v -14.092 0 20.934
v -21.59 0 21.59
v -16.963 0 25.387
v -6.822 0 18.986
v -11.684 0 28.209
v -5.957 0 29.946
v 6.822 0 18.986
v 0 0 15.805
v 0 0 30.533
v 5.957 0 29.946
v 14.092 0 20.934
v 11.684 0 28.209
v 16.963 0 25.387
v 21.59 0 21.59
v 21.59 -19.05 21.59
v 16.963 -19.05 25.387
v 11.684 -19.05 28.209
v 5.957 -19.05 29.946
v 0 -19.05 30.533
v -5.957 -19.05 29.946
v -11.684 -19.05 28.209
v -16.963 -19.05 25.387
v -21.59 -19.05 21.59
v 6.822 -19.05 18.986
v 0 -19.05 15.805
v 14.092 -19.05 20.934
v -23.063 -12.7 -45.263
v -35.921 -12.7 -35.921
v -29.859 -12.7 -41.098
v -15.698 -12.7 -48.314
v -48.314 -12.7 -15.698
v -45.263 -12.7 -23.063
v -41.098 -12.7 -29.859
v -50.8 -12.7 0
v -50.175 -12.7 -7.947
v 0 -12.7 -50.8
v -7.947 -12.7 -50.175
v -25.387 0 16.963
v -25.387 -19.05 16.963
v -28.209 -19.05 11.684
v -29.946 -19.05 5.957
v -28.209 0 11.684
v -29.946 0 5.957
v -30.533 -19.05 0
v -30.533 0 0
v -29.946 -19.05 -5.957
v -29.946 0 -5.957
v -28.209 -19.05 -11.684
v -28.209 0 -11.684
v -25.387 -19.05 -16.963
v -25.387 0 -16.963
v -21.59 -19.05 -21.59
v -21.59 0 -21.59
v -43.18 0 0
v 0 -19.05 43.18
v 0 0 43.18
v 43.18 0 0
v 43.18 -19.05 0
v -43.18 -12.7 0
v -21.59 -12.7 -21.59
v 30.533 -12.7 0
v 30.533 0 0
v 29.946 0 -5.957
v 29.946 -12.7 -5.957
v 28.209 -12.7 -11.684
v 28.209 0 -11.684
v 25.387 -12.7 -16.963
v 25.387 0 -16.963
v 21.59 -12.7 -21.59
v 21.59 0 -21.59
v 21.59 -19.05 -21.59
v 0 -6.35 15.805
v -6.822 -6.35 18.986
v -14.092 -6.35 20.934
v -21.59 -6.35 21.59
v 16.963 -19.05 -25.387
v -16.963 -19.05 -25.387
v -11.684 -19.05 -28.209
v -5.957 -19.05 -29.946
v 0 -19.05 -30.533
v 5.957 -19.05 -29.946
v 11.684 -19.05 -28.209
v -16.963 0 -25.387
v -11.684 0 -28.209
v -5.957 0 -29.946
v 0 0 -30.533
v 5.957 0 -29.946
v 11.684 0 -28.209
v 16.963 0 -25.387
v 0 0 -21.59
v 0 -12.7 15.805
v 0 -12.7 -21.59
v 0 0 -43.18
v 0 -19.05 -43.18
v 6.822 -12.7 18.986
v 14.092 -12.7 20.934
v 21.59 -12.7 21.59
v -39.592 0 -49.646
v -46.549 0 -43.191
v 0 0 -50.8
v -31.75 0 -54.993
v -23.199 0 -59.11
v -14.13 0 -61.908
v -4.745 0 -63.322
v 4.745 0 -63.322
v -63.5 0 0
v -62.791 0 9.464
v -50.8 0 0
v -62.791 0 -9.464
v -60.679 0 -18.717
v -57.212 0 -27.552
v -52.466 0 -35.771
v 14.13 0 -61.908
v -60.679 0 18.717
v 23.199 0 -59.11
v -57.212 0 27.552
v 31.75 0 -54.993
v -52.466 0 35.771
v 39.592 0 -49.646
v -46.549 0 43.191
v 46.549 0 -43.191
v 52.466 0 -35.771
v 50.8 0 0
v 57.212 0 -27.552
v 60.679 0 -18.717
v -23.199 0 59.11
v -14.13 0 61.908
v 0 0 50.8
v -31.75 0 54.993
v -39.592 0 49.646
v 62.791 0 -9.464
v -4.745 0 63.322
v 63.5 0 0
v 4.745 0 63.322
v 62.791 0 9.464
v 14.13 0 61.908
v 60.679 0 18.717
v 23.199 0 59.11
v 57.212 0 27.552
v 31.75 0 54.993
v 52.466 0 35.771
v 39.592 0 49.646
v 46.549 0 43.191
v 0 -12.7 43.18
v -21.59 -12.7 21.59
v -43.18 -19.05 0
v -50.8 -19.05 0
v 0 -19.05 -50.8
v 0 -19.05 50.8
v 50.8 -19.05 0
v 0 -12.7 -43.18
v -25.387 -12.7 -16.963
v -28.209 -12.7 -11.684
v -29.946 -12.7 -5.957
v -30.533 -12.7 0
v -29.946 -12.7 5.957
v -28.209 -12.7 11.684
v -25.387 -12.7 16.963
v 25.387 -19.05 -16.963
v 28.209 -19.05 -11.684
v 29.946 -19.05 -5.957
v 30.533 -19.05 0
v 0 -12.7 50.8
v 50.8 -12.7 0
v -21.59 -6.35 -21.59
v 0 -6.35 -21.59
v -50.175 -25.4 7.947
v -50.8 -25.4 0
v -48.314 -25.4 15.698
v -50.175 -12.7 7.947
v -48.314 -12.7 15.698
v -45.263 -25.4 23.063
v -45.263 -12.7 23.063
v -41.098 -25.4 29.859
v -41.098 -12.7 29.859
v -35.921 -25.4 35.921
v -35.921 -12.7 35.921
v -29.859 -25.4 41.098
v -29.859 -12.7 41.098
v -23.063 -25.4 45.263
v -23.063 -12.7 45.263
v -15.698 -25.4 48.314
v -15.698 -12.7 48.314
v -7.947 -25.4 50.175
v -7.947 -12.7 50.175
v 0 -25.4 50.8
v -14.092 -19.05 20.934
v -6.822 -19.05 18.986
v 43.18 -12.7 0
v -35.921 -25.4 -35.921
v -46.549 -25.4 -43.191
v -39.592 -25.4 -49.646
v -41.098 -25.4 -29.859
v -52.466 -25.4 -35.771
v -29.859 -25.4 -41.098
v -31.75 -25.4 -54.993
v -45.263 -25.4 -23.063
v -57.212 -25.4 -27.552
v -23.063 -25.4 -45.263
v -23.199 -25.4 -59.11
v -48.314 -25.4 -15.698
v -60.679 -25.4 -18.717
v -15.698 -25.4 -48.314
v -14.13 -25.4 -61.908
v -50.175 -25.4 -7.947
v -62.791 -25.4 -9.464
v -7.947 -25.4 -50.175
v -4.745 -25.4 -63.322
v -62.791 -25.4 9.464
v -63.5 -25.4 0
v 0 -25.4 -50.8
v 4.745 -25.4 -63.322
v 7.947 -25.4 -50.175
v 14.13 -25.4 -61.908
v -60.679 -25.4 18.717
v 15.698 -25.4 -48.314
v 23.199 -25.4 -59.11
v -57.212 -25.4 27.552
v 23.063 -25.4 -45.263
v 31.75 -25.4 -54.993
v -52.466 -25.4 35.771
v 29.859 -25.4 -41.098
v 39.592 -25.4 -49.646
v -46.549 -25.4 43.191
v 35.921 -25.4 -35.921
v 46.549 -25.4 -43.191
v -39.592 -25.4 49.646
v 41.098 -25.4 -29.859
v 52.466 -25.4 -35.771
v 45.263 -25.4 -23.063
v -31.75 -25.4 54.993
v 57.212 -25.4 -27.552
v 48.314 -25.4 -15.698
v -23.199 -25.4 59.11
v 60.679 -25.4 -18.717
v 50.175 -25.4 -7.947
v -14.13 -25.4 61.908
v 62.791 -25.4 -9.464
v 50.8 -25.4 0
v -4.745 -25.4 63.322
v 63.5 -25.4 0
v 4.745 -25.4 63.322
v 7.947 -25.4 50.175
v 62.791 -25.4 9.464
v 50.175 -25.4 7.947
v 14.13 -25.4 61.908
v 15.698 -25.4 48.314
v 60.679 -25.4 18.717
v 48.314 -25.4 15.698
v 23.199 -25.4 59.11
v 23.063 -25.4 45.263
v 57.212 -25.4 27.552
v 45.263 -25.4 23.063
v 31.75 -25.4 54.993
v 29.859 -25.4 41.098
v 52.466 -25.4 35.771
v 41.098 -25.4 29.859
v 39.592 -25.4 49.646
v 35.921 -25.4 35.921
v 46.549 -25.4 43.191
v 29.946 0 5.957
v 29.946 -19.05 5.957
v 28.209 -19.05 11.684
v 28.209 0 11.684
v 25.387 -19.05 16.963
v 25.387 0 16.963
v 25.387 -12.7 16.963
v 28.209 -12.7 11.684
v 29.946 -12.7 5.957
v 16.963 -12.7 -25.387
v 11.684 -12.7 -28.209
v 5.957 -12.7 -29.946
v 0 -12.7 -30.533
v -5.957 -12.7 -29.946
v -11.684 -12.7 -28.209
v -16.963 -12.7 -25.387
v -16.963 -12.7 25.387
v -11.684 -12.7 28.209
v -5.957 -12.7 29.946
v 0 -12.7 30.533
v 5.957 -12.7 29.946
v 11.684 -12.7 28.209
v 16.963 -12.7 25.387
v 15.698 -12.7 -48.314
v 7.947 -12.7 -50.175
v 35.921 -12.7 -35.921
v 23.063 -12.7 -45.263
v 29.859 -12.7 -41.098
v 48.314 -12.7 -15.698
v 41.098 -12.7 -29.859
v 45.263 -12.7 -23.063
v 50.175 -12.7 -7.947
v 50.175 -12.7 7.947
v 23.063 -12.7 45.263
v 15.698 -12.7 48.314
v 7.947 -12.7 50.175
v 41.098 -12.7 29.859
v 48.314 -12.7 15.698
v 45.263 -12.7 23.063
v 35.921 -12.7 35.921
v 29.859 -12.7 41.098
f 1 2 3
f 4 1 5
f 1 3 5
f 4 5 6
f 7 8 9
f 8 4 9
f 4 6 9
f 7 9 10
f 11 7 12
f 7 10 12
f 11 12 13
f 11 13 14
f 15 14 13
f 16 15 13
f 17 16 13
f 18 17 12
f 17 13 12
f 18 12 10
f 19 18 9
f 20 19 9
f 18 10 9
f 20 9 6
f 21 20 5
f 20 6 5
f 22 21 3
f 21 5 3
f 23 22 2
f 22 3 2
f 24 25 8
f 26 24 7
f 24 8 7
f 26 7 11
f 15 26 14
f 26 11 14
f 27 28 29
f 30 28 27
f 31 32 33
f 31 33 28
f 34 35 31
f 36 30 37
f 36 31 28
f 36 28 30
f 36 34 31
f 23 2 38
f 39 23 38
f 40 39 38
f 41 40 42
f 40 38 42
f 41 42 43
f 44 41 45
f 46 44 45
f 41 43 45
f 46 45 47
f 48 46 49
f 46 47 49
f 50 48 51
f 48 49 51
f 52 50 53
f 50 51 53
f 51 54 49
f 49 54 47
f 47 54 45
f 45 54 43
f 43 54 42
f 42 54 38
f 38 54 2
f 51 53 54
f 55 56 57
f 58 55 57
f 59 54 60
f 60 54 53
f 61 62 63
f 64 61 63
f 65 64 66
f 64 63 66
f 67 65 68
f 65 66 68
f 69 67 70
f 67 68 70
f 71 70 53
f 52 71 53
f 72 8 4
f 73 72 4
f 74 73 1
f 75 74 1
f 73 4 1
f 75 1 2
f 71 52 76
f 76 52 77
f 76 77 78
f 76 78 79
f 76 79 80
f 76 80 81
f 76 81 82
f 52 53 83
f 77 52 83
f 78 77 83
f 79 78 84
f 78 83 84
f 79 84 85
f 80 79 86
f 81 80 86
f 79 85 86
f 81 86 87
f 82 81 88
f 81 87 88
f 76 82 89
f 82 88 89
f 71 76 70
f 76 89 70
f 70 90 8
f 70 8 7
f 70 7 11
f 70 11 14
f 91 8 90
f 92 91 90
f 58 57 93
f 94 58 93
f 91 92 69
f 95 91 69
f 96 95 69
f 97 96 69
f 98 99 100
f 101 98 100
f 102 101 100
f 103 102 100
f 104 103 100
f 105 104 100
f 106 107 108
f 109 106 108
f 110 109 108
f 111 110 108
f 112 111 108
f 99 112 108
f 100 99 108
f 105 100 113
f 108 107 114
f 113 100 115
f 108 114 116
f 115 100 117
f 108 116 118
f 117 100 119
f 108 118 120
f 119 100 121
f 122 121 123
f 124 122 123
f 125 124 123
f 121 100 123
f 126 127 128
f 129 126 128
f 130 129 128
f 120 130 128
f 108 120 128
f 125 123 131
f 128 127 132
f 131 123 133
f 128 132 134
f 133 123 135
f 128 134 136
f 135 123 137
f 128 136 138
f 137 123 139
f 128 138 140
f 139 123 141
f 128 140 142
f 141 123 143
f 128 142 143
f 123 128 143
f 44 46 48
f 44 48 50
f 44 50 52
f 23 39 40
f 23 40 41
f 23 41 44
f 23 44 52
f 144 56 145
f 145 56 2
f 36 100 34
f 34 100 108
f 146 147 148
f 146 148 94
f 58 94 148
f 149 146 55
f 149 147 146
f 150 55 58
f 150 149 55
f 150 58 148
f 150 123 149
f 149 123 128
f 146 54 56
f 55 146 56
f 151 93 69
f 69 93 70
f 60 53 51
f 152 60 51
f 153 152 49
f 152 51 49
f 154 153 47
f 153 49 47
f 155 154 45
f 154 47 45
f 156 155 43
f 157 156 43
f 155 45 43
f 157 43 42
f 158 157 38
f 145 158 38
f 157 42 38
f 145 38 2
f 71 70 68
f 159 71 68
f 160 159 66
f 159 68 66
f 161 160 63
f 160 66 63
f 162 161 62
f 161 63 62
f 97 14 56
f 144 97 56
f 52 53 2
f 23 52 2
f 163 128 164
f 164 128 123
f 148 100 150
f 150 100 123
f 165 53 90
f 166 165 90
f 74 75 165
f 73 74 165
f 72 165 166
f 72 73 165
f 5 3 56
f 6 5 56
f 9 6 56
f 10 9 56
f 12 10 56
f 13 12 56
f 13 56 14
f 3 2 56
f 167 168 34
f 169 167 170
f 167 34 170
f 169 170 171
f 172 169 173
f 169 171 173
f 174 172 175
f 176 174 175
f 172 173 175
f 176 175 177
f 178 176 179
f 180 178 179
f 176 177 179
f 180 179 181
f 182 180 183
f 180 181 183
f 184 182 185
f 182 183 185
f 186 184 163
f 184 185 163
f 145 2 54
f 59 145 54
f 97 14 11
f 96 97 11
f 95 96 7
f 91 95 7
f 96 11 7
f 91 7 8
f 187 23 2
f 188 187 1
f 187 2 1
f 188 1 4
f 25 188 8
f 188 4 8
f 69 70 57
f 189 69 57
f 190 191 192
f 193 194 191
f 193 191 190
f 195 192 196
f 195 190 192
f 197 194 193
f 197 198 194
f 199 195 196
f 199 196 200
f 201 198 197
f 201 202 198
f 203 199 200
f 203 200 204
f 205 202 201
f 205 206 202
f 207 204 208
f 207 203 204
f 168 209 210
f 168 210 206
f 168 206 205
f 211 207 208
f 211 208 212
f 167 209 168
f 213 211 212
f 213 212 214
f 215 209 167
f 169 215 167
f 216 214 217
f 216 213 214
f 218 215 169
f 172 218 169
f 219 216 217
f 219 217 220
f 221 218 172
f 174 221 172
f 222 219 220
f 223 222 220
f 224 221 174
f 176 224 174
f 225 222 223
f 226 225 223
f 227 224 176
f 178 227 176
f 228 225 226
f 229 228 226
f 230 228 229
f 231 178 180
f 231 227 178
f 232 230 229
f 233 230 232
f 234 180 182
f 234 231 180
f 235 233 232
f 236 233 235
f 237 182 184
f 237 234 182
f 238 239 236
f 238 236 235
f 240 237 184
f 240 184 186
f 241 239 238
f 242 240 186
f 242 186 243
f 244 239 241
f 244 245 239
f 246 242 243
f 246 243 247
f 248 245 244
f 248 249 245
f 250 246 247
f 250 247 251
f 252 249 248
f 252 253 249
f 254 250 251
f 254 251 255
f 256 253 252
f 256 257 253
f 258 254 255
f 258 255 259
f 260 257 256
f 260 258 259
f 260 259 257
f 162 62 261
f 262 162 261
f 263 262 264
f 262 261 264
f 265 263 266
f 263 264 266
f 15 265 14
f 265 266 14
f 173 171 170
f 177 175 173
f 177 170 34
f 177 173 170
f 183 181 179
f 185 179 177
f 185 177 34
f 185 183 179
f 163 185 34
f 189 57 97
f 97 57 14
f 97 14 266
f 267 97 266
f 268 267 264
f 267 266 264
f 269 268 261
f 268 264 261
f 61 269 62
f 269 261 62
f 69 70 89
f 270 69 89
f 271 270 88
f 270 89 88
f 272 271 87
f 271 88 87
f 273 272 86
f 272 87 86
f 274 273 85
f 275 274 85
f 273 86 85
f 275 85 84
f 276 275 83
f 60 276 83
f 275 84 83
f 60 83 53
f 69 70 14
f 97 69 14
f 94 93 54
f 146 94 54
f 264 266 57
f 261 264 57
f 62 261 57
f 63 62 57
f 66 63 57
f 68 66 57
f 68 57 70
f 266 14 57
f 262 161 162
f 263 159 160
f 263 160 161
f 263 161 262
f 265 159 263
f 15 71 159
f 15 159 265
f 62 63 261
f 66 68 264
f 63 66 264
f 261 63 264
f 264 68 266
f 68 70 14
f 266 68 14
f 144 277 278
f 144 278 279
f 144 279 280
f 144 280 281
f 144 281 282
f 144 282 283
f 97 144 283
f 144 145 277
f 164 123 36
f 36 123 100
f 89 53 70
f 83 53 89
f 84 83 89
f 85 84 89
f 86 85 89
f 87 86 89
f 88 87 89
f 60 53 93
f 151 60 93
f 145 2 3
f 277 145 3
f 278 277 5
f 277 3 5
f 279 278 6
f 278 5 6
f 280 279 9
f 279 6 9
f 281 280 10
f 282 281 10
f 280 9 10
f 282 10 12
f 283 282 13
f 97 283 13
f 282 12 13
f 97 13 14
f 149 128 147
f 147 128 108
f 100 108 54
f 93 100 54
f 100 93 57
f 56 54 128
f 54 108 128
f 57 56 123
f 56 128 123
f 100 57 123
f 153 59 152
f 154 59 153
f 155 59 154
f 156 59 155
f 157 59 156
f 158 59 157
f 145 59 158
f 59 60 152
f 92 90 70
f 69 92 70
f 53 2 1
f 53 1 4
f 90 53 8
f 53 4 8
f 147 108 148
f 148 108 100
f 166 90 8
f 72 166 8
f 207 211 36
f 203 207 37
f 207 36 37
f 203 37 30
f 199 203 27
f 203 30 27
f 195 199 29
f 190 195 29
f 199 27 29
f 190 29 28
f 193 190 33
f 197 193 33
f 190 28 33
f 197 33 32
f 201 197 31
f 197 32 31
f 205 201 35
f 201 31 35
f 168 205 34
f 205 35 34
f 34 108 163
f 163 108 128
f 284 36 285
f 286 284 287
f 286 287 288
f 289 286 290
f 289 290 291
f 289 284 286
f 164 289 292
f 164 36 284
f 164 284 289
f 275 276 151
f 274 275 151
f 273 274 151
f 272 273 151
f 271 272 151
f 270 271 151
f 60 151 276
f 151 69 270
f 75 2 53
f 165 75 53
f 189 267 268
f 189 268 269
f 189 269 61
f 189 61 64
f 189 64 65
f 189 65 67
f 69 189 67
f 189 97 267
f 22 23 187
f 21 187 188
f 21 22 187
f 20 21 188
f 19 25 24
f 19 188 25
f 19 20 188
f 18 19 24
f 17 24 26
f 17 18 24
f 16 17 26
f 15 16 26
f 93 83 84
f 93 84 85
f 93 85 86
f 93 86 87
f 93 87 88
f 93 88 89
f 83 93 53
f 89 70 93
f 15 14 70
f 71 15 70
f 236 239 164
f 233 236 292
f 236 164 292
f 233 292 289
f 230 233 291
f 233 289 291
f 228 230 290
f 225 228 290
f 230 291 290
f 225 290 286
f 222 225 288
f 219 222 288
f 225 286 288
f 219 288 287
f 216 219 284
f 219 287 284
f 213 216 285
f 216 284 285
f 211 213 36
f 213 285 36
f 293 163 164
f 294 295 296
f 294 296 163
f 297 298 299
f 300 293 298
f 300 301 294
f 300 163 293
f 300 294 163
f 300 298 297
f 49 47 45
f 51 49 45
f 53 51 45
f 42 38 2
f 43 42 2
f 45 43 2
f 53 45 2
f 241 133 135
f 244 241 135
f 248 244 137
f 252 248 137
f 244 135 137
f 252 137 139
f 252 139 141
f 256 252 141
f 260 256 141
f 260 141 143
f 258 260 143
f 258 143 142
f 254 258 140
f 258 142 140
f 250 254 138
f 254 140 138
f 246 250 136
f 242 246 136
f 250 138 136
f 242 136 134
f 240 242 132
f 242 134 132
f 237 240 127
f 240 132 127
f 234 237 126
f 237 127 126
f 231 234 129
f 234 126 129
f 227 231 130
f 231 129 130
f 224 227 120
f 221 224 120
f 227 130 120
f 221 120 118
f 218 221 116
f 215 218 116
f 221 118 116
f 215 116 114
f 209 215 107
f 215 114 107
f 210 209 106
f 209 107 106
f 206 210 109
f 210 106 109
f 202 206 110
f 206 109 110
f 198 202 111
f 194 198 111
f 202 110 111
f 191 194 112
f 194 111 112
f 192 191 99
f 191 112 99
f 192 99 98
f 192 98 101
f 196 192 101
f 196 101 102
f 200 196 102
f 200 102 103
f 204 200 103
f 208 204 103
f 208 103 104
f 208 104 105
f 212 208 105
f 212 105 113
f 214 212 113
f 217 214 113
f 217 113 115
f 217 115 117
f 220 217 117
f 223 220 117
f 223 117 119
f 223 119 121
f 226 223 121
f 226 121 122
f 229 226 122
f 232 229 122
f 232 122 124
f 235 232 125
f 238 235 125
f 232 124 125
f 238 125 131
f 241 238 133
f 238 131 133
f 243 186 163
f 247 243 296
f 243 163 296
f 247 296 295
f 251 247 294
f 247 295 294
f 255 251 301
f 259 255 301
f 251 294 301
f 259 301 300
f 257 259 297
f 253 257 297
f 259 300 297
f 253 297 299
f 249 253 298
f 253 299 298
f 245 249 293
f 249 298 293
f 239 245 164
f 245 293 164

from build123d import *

# Parameters (mm, degrees)
F0_R     = 63.5
F1_DEPTH = 25.4
F2_DEPTH = 12.7
F3_DEPTH = 12.7
F4_DEPTH = 19.05
F5_DEPTH = 19.05
F6_DEPTH = 6.35
F7_DEPTH = 12.7


with BuildPart() as f1:
    # F0 (on Front) → F1 (new body)
    with BuildSketch(Plane.XZ):
        Circle(F0_R)
        with BuildLine():
            ThreePointArc((0, 50.8), (35.921024, 35.921024), (50.8, 0))
            ThreePointArc((50.8, 0), (35.921024, -35.921024), (0, -50.8))
            ThreePointArc((0, -50.8), (-35.921024, -35.921024), (-50.8, 0))
            ThreePointArc((-50.8, 0), (-35.921024, 35.921024), (0, 50.8))
        make_face(mode=Mode.SUBTRACT)
    extrude(amount=F1_DEPTH)

    # F0 (on Front) → F2 (join)
    with BuildSketch(Plane.XZ):
        with BuildLine():
            Line((-50.8, 0), (0, 50.8))
            ThreePointArc((0, 50.8), (-35.921024, 35.921024), (-50.8, 0))
        make_face()
        with BuildLine():
            ThreePointArc((-50.8, 0), (-35.921024, -35.921024), (0, -50.8))
            Line((0, -50.8), (-50.8, 0))
        make_face()
        with BuildLine():
            ThreePointArc((0, -50.8), (35.921024, -35.921024), (50.8, 0))
            Line((50.8, 0), (0, -50.8))
        make_face()
        with BuildLine():
            Line((0, 50.8), (50.8, 0))
            ThreePointArc((50.8, 0), (35.921024, 35.921024), (0, 50.8))
        make_face()
    extrude(amount=F2_DEPTH)


with BuildPart() as f3:
    # F0 (on Front) → F3 (new body)
    with BuildSketch(Plane.XZ):
        with BuildLine():
            Line((-21.59, 21.59), (-43.18, 0))
            Line((-43.18, 0), (-21.59, -21.59))
            ThreePointArc((-21.59, -21.59), (-30.532871, 0), (-21.59, 21.59))
        make_face()
        with BuildLine():
            Line((-21.59, -21.59), (0, -43.18))
            Line((0, -43.18), (21.59, -21.59))
            ThreePointArc((21.59, -21.59), (0, -30.532871), (-21.59, -21.59))
        make_face()
        with BuildLine():
            Line((21.59, -21.59), (43.18, 0))
            Line((43.18, 0), (21.59, 21.59))
            ThreePointArc((21.59, 21.59), (28.208694, 11.684424), (30.532871, 0))
            ThreePointArc((30.532871, 0), (28.208694, -11.684424), (21.59, -21.59))
        make_face()
        with BuildLine():
            Line((21.59, 21.59), (0, 43.18))
            Line((0, 43.18), (-21.59, 21.59))
            ThreePointArc((-21.59, 21.59), (0, 30.532871), (21.59, 21.59))
        make_face()
    extrude(amount=F3_DEPTH)


with BuildPart() as f4:
    # F0 (on Front) → F4 (new body)
    with BuildSketch(Plane.XZ):
        with BuildLine():
            ThreePointArc((0, 15.804977), (10.414194, 20.118677), (21.59, 21.59))
            ThreePointArc((21.59, 21.59), (0, 30.532871), (-21.59, 21.59))
            ThreePointArc((-21.59, 21.59), (-10.414194, 20.118677), (0, 15.804977))
        make_face()
        with BuildLine():
            Line((-21.59, -21.59), (-21.59, 21.59))
            ThreePointArc((-21.59, 21.59), (-30.532871, 0), (-21.59, -21.59))
        make_face()
        with BuildLine():
            ThreePointArc((30.532871, 0), (28.208694, 11.684424), (21.59, 21.59))
            Line((21.59, 21.59), (21.59, -21.59))
            ThreePointArc((21.59, -21.59), (28.208694, -11.684424), (30.532871, 0))
        make_face()
        with BuildLine():
            ThreePointArc((-21.59, -21.59), (0, -30.532871), (21.59, -21.59))
            Line((21.59, -21.59), (0, -21.59))
            Line((0, -21.59), (-21.59, -21.59))
        make_face()
    extrude(amount=F4_DEPTH)


with BuildPart() as f5:
    # F0 (on Front) → F5 (new body)
    with BuildSketch(Plane.XZ):
        Polygon((-50.8, 0), (0, -50.8), (0, -43.18), (-21.59, -21.59), (-43.18, 0), align=None)
        Polygon((0, 43.18), (0, 50.8), (-50.8, 0), (-43.18, 0), (-21.59, 21.59), align=None)
        Polygon((0, -50.8), (50.8, 0), (43.18, 0), (21.59, -21.59), (0, -43.18), align=None)
        Polygon((43.18, 0), (50.8, 0), (0, 50.8), (0, 43.18), (21.59, 21.59), align=None)
    extrude(amount=F5_DEPTH)


with BuildPart() as f6:
    # F0 (on Front) → F6 (new body)
    with BuildSketch(Plane.XZ):
        with BuildLine():
            ThreePointArc((0, 15.804977), (-10.414194, 20.118677), (-21.59, 21.59))
            Line((-21.59, 21.59), (-21.59, -21.59))
            Line((-21.59, -21.59), (0, -21.59))
            Line((0, -21.59), (0, 15.804977))
        make_face()
    extrude(amount=F6_DEPTH)


with BuildPart() as f7:
    # F0 (on Front) → F7 (new body)
    with BuildSketch(Plane.XZ):
        with BuildLine():
            Line((21.59, -21.59), (21.59, 21.59))
            ThreePointArc((21.59, 21.59), (10.414194, 20.118677), (0, 15.804977))
            Line((0, 15.804977), (0, -21.59))
            Line((0, -21.59), (21.59, -21.59))
        make_face()
    extrude(amount=F7_DEPTH)


solid = Compound([f1.part, f3.part, f4.part, f5.part, f6.part, f7.part])
